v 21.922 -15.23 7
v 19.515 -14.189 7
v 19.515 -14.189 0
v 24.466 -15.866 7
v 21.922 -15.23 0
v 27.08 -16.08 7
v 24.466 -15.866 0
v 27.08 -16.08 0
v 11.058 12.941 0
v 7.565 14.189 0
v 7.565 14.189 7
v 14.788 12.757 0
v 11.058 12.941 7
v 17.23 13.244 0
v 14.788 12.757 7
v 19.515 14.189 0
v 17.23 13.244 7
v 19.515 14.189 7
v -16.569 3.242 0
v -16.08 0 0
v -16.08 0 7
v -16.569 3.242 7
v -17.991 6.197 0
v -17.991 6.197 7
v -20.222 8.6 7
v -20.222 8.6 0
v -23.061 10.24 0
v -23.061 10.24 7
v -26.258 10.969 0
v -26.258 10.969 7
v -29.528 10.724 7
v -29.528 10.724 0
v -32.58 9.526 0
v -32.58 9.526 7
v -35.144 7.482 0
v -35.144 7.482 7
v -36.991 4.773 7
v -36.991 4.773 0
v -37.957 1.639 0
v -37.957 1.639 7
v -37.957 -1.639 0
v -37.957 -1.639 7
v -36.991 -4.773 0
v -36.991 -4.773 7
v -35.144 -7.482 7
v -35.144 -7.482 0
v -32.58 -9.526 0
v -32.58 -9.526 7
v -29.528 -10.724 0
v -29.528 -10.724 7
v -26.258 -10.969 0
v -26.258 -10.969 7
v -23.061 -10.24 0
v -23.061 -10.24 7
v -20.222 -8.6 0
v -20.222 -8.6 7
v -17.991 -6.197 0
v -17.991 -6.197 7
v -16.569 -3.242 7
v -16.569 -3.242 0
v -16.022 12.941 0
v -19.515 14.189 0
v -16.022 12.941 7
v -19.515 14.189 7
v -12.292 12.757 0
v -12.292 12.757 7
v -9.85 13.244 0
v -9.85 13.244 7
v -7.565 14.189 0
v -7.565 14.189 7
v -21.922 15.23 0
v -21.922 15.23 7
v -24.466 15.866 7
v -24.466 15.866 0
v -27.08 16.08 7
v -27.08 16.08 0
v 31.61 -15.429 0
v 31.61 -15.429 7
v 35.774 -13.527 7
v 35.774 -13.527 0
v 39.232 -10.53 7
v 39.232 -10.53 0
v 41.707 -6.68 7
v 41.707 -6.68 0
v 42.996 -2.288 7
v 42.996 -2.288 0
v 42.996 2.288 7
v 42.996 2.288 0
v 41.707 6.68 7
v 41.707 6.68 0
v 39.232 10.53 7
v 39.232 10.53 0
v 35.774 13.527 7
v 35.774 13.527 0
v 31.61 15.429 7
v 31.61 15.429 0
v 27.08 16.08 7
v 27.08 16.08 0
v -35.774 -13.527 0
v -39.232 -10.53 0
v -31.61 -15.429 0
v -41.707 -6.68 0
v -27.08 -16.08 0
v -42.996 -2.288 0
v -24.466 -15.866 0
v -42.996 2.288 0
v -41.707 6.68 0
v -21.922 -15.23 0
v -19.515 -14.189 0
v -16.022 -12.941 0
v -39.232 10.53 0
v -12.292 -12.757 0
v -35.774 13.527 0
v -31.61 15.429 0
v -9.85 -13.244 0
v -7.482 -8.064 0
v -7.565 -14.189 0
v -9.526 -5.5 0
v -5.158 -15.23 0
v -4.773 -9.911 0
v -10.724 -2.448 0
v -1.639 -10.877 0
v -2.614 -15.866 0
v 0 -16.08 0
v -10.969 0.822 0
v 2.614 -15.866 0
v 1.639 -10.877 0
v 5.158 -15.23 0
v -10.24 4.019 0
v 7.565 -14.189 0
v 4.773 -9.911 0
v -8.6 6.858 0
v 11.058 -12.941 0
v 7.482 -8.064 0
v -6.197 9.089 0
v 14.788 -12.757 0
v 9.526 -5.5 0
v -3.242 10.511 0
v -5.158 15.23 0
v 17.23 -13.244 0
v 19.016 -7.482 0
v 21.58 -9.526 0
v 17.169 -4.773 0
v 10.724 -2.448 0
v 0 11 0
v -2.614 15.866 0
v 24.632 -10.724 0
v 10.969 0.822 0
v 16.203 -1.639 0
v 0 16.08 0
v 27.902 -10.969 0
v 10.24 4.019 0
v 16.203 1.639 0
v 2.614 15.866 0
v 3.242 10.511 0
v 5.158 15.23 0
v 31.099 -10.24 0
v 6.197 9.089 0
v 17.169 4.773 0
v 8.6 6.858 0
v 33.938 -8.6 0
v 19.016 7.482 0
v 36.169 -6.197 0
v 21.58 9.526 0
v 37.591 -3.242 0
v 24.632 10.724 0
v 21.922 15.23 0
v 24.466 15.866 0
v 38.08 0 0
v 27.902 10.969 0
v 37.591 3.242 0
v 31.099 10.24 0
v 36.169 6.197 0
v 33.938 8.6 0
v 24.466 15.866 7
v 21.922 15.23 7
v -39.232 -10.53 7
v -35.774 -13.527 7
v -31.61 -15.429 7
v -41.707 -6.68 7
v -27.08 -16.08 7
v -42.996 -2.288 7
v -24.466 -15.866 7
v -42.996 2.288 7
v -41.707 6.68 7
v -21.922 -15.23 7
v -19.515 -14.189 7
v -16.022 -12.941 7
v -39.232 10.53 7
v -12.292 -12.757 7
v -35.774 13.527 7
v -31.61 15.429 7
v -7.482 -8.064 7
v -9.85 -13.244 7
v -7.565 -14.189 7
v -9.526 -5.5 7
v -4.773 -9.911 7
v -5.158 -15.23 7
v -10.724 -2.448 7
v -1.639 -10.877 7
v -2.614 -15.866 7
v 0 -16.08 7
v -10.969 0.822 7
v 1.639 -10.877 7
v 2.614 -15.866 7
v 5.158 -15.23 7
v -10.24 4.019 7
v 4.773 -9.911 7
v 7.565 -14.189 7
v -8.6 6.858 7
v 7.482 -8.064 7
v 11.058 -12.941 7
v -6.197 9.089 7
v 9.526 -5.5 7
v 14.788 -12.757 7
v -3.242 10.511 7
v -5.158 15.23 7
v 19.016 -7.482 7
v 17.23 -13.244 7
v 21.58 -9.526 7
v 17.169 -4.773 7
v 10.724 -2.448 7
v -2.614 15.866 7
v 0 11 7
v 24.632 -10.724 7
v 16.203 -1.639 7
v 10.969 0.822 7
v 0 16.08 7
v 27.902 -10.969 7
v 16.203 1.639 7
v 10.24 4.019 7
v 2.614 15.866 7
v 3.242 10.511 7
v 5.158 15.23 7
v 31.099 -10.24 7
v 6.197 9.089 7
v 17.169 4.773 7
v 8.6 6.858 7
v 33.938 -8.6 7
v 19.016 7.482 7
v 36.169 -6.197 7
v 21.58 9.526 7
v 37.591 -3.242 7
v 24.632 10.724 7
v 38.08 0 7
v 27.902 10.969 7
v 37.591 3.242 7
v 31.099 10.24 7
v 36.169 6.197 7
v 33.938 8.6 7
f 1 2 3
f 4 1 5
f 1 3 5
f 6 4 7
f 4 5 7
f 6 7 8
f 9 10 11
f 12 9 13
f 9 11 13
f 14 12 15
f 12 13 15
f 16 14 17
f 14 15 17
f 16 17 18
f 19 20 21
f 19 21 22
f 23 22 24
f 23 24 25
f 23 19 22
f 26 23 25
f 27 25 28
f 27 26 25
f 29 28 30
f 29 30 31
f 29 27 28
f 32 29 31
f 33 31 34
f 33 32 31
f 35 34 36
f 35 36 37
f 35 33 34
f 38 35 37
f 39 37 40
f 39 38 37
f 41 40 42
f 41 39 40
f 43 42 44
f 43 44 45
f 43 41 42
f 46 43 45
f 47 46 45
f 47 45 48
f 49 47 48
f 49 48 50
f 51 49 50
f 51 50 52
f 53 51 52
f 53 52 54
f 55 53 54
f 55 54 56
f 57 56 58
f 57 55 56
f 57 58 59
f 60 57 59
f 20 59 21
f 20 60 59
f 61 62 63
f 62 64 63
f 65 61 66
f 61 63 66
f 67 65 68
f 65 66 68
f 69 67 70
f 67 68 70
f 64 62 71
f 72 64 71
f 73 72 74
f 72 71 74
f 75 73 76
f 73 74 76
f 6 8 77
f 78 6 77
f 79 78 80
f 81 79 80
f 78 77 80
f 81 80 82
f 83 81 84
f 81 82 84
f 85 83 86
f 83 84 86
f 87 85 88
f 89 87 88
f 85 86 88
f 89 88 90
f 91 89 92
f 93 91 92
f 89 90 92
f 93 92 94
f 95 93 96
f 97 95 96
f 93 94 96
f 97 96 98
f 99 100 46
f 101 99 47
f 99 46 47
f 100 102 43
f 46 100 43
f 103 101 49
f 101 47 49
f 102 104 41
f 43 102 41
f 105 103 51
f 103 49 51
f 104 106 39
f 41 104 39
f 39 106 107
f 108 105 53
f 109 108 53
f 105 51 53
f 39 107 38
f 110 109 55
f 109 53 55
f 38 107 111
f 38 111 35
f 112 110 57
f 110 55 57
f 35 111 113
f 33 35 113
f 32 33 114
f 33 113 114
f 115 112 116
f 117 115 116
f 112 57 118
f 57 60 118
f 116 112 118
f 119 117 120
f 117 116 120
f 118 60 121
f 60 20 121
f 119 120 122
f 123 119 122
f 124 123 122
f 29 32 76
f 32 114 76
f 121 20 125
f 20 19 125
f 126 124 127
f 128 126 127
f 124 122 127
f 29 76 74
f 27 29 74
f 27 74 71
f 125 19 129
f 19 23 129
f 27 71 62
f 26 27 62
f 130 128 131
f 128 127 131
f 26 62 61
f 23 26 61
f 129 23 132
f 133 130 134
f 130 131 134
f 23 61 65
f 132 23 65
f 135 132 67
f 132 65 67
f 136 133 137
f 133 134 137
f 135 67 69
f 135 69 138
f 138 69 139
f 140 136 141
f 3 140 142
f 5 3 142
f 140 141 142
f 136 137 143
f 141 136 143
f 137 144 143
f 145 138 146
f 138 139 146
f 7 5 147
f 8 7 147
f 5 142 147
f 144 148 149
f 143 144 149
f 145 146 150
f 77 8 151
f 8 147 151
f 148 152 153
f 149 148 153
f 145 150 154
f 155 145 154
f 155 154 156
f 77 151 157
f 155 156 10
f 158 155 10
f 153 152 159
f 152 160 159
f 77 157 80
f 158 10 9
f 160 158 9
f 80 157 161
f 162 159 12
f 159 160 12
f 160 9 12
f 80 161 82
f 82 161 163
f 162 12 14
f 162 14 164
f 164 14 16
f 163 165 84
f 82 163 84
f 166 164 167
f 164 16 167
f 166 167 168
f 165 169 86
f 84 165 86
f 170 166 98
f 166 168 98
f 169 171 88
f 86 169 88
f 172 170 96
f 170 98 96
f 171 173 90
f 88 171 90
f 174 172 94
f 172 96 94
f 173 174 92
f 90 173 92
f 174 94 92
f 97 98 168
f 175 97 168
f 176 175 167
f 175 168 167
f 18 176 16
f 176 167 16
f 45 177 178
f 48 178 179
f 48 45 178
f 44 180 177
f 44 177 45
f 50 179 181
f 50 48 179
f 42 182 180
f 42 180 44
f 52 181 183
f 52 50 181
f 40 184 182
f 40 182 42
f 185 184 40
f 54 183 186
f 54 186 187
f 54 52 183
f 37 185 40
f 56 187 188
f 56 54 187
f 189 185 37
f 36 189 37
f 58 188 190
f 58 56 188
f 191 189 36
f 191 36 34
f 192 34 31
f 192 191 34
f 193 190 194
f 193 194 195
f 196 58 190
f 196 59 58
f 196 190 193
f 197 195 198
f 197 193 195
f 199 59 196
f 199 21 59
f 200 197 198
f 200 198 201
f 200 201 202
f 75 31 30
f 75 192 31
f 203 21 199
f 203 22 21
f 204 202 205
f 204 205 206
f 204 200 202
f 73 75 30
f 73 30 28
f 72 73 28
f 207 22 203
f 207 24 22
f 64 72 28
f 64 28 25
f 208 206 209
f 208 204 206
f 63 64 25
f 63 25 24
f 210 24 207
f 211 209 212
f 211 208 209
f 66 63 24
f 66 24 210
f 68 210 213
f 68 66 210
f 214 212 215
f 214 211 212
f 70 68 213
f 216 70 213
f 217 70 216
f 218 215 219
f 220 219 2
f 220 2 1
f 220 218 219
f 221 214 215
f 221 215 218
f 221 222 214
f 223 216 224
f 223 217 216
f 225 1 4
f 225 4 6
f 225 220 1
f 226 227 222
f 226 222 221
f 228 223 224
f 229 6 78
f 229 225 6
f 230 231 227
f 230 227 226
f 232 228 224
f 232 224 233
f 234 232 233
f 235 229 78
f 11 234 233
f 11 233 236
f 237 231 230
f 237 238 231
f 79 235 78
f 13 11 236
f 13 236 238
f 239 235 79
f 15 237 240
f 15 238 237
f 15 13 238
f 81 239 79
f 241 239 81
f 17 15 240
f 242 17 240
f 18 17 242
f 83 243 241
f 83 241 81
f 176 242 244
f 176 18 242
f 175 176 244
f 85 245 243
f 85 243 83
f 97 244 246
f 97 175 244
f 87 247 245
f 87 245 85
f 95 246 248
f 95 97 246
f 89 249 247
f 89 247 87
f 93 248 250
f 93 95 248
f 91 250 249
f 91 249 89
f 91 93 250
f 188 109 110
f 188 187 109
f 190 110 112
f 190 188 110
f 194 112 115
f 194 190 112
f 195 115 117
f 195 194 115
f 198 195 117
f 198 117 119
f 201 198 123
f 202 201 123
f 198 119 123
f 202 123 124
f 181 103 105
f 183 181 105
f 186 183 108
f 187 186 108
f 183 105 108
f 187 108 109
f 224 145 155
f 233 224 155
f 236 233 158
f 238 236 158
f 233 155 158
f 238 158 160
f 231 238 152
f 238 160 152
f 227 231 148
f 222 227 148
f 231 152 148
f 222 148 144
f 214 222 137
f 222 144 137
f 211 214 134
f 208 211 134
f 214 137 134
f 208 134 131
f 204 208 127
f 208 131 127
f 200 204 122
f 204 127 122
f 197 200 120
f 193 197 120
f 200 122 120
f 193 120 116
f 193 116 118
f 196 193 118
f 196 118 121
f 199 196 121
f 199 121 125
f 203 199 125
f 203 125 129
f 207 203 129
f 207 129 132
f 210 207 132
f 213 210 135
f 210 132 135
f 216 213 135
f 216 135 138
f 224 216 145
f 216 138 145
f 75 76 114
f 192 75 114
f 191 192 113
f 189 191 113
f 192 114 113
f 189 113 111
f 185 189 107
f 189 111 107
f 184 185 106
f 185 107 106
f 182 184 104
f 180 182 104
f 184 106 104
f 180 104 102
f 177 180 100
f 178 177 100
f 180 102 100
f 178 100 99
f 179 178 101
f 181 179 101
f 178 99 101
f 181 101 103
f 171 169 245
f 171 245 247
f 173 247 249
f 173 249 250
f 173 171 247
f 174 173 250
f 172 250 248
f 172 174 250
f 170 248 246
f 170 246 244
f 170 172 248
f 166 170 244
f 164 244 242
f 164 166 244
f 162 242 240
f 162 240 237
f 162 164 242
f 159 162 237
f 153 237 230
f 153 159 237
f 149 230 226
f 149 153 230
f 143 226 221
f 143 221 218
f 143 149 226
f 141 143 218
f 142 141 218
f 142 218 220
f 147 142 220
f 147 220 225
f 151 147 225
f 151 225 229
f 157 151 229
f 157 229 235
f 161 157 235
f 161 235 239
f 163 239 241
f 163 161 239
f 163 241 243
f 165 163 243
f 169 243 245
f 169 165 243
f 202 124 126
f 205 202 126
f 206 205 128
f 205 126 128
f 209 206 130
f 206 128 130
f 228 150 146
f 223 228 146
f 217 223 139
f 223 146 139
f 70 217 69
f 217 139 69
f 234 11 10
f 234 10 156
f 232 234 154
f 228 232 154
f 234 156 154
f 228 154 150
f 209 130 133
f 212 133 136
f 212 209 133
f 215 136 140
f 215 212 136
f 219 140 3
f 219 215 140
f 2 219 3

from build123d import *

# Parameters (mm, degrees)
F0_R     = 11
F1_DEPTH = 7
F2_R     = 12.7


with BuildPart() as f1:
    # F0 (on Top) → F1 (new body)
    with BuildSketch(Plane.XY):
        with BuildLine():
            ThreePointArc((-27.08, 16.08), (-43.16, 0), (-27.08, -16.08))
            ThreePointArc((-27.08, -16.08), (-19.363404, -14.107464), (-13.54, -8.6738))
            ThreePointArc((-13.54, -8.6738), (-7.716596, -14.107464), (0, -16.08))
            ThreePointArc((0, -16.08), (7.716596, -14.107464), (13.54, -8.6738))
            ThreePointArc((13.54, -8.6738), (19.363404, -14.107464), (27.08, -16.08))
            ThreePointArc((27.08, -16.08), (43.16, 0), (27.08, 16.08))
            ThreePointArc((27.08, 16.08), (19.363404, 14.107464), (13.54, 8.6738))
            ThreePointArc((13.54, 8.6738), (7.716596, 14.107464), (0, 16.08))
            ThreePointArc((0, 16.08), (-7.716596, 14.107464), (-13.54, 8.6738))
            ThreePointArc((-13.54, 8.6738), (-19.363404, 14.107464), (-27.08, 16.08))
        make_face()
        with Locations((-27.08, 0)):
            Circle(F0_R, mode=Mode.SUBTRACT)
        with BuildLine():
            ThreePointArc((0, -11), (-11, 0), (0, 11))
            ThreePointArc((0, 11), (11, 0), (0, -11))
        make_face(mode=Mode.SUBTRACT)
        with Locations((27.08, 0)):
            Circle(F0_R, mode=Mode.SUBTRACT)
    extrude(amount=F1_DEPTH)

    # F2
    f2_edges = [f1.edges().sort_by_distance(p)[0] for p in [
        (-13.54, -8.6738, 3.5),
        (13.54, -8.6738, 3.5),
        (-13.54, 8.6738, 3.5),
        (13.54, 8.6738, 3.5),
    ]]
    fillet(f2_edges, radius=F2_R)


solid = f1.part
